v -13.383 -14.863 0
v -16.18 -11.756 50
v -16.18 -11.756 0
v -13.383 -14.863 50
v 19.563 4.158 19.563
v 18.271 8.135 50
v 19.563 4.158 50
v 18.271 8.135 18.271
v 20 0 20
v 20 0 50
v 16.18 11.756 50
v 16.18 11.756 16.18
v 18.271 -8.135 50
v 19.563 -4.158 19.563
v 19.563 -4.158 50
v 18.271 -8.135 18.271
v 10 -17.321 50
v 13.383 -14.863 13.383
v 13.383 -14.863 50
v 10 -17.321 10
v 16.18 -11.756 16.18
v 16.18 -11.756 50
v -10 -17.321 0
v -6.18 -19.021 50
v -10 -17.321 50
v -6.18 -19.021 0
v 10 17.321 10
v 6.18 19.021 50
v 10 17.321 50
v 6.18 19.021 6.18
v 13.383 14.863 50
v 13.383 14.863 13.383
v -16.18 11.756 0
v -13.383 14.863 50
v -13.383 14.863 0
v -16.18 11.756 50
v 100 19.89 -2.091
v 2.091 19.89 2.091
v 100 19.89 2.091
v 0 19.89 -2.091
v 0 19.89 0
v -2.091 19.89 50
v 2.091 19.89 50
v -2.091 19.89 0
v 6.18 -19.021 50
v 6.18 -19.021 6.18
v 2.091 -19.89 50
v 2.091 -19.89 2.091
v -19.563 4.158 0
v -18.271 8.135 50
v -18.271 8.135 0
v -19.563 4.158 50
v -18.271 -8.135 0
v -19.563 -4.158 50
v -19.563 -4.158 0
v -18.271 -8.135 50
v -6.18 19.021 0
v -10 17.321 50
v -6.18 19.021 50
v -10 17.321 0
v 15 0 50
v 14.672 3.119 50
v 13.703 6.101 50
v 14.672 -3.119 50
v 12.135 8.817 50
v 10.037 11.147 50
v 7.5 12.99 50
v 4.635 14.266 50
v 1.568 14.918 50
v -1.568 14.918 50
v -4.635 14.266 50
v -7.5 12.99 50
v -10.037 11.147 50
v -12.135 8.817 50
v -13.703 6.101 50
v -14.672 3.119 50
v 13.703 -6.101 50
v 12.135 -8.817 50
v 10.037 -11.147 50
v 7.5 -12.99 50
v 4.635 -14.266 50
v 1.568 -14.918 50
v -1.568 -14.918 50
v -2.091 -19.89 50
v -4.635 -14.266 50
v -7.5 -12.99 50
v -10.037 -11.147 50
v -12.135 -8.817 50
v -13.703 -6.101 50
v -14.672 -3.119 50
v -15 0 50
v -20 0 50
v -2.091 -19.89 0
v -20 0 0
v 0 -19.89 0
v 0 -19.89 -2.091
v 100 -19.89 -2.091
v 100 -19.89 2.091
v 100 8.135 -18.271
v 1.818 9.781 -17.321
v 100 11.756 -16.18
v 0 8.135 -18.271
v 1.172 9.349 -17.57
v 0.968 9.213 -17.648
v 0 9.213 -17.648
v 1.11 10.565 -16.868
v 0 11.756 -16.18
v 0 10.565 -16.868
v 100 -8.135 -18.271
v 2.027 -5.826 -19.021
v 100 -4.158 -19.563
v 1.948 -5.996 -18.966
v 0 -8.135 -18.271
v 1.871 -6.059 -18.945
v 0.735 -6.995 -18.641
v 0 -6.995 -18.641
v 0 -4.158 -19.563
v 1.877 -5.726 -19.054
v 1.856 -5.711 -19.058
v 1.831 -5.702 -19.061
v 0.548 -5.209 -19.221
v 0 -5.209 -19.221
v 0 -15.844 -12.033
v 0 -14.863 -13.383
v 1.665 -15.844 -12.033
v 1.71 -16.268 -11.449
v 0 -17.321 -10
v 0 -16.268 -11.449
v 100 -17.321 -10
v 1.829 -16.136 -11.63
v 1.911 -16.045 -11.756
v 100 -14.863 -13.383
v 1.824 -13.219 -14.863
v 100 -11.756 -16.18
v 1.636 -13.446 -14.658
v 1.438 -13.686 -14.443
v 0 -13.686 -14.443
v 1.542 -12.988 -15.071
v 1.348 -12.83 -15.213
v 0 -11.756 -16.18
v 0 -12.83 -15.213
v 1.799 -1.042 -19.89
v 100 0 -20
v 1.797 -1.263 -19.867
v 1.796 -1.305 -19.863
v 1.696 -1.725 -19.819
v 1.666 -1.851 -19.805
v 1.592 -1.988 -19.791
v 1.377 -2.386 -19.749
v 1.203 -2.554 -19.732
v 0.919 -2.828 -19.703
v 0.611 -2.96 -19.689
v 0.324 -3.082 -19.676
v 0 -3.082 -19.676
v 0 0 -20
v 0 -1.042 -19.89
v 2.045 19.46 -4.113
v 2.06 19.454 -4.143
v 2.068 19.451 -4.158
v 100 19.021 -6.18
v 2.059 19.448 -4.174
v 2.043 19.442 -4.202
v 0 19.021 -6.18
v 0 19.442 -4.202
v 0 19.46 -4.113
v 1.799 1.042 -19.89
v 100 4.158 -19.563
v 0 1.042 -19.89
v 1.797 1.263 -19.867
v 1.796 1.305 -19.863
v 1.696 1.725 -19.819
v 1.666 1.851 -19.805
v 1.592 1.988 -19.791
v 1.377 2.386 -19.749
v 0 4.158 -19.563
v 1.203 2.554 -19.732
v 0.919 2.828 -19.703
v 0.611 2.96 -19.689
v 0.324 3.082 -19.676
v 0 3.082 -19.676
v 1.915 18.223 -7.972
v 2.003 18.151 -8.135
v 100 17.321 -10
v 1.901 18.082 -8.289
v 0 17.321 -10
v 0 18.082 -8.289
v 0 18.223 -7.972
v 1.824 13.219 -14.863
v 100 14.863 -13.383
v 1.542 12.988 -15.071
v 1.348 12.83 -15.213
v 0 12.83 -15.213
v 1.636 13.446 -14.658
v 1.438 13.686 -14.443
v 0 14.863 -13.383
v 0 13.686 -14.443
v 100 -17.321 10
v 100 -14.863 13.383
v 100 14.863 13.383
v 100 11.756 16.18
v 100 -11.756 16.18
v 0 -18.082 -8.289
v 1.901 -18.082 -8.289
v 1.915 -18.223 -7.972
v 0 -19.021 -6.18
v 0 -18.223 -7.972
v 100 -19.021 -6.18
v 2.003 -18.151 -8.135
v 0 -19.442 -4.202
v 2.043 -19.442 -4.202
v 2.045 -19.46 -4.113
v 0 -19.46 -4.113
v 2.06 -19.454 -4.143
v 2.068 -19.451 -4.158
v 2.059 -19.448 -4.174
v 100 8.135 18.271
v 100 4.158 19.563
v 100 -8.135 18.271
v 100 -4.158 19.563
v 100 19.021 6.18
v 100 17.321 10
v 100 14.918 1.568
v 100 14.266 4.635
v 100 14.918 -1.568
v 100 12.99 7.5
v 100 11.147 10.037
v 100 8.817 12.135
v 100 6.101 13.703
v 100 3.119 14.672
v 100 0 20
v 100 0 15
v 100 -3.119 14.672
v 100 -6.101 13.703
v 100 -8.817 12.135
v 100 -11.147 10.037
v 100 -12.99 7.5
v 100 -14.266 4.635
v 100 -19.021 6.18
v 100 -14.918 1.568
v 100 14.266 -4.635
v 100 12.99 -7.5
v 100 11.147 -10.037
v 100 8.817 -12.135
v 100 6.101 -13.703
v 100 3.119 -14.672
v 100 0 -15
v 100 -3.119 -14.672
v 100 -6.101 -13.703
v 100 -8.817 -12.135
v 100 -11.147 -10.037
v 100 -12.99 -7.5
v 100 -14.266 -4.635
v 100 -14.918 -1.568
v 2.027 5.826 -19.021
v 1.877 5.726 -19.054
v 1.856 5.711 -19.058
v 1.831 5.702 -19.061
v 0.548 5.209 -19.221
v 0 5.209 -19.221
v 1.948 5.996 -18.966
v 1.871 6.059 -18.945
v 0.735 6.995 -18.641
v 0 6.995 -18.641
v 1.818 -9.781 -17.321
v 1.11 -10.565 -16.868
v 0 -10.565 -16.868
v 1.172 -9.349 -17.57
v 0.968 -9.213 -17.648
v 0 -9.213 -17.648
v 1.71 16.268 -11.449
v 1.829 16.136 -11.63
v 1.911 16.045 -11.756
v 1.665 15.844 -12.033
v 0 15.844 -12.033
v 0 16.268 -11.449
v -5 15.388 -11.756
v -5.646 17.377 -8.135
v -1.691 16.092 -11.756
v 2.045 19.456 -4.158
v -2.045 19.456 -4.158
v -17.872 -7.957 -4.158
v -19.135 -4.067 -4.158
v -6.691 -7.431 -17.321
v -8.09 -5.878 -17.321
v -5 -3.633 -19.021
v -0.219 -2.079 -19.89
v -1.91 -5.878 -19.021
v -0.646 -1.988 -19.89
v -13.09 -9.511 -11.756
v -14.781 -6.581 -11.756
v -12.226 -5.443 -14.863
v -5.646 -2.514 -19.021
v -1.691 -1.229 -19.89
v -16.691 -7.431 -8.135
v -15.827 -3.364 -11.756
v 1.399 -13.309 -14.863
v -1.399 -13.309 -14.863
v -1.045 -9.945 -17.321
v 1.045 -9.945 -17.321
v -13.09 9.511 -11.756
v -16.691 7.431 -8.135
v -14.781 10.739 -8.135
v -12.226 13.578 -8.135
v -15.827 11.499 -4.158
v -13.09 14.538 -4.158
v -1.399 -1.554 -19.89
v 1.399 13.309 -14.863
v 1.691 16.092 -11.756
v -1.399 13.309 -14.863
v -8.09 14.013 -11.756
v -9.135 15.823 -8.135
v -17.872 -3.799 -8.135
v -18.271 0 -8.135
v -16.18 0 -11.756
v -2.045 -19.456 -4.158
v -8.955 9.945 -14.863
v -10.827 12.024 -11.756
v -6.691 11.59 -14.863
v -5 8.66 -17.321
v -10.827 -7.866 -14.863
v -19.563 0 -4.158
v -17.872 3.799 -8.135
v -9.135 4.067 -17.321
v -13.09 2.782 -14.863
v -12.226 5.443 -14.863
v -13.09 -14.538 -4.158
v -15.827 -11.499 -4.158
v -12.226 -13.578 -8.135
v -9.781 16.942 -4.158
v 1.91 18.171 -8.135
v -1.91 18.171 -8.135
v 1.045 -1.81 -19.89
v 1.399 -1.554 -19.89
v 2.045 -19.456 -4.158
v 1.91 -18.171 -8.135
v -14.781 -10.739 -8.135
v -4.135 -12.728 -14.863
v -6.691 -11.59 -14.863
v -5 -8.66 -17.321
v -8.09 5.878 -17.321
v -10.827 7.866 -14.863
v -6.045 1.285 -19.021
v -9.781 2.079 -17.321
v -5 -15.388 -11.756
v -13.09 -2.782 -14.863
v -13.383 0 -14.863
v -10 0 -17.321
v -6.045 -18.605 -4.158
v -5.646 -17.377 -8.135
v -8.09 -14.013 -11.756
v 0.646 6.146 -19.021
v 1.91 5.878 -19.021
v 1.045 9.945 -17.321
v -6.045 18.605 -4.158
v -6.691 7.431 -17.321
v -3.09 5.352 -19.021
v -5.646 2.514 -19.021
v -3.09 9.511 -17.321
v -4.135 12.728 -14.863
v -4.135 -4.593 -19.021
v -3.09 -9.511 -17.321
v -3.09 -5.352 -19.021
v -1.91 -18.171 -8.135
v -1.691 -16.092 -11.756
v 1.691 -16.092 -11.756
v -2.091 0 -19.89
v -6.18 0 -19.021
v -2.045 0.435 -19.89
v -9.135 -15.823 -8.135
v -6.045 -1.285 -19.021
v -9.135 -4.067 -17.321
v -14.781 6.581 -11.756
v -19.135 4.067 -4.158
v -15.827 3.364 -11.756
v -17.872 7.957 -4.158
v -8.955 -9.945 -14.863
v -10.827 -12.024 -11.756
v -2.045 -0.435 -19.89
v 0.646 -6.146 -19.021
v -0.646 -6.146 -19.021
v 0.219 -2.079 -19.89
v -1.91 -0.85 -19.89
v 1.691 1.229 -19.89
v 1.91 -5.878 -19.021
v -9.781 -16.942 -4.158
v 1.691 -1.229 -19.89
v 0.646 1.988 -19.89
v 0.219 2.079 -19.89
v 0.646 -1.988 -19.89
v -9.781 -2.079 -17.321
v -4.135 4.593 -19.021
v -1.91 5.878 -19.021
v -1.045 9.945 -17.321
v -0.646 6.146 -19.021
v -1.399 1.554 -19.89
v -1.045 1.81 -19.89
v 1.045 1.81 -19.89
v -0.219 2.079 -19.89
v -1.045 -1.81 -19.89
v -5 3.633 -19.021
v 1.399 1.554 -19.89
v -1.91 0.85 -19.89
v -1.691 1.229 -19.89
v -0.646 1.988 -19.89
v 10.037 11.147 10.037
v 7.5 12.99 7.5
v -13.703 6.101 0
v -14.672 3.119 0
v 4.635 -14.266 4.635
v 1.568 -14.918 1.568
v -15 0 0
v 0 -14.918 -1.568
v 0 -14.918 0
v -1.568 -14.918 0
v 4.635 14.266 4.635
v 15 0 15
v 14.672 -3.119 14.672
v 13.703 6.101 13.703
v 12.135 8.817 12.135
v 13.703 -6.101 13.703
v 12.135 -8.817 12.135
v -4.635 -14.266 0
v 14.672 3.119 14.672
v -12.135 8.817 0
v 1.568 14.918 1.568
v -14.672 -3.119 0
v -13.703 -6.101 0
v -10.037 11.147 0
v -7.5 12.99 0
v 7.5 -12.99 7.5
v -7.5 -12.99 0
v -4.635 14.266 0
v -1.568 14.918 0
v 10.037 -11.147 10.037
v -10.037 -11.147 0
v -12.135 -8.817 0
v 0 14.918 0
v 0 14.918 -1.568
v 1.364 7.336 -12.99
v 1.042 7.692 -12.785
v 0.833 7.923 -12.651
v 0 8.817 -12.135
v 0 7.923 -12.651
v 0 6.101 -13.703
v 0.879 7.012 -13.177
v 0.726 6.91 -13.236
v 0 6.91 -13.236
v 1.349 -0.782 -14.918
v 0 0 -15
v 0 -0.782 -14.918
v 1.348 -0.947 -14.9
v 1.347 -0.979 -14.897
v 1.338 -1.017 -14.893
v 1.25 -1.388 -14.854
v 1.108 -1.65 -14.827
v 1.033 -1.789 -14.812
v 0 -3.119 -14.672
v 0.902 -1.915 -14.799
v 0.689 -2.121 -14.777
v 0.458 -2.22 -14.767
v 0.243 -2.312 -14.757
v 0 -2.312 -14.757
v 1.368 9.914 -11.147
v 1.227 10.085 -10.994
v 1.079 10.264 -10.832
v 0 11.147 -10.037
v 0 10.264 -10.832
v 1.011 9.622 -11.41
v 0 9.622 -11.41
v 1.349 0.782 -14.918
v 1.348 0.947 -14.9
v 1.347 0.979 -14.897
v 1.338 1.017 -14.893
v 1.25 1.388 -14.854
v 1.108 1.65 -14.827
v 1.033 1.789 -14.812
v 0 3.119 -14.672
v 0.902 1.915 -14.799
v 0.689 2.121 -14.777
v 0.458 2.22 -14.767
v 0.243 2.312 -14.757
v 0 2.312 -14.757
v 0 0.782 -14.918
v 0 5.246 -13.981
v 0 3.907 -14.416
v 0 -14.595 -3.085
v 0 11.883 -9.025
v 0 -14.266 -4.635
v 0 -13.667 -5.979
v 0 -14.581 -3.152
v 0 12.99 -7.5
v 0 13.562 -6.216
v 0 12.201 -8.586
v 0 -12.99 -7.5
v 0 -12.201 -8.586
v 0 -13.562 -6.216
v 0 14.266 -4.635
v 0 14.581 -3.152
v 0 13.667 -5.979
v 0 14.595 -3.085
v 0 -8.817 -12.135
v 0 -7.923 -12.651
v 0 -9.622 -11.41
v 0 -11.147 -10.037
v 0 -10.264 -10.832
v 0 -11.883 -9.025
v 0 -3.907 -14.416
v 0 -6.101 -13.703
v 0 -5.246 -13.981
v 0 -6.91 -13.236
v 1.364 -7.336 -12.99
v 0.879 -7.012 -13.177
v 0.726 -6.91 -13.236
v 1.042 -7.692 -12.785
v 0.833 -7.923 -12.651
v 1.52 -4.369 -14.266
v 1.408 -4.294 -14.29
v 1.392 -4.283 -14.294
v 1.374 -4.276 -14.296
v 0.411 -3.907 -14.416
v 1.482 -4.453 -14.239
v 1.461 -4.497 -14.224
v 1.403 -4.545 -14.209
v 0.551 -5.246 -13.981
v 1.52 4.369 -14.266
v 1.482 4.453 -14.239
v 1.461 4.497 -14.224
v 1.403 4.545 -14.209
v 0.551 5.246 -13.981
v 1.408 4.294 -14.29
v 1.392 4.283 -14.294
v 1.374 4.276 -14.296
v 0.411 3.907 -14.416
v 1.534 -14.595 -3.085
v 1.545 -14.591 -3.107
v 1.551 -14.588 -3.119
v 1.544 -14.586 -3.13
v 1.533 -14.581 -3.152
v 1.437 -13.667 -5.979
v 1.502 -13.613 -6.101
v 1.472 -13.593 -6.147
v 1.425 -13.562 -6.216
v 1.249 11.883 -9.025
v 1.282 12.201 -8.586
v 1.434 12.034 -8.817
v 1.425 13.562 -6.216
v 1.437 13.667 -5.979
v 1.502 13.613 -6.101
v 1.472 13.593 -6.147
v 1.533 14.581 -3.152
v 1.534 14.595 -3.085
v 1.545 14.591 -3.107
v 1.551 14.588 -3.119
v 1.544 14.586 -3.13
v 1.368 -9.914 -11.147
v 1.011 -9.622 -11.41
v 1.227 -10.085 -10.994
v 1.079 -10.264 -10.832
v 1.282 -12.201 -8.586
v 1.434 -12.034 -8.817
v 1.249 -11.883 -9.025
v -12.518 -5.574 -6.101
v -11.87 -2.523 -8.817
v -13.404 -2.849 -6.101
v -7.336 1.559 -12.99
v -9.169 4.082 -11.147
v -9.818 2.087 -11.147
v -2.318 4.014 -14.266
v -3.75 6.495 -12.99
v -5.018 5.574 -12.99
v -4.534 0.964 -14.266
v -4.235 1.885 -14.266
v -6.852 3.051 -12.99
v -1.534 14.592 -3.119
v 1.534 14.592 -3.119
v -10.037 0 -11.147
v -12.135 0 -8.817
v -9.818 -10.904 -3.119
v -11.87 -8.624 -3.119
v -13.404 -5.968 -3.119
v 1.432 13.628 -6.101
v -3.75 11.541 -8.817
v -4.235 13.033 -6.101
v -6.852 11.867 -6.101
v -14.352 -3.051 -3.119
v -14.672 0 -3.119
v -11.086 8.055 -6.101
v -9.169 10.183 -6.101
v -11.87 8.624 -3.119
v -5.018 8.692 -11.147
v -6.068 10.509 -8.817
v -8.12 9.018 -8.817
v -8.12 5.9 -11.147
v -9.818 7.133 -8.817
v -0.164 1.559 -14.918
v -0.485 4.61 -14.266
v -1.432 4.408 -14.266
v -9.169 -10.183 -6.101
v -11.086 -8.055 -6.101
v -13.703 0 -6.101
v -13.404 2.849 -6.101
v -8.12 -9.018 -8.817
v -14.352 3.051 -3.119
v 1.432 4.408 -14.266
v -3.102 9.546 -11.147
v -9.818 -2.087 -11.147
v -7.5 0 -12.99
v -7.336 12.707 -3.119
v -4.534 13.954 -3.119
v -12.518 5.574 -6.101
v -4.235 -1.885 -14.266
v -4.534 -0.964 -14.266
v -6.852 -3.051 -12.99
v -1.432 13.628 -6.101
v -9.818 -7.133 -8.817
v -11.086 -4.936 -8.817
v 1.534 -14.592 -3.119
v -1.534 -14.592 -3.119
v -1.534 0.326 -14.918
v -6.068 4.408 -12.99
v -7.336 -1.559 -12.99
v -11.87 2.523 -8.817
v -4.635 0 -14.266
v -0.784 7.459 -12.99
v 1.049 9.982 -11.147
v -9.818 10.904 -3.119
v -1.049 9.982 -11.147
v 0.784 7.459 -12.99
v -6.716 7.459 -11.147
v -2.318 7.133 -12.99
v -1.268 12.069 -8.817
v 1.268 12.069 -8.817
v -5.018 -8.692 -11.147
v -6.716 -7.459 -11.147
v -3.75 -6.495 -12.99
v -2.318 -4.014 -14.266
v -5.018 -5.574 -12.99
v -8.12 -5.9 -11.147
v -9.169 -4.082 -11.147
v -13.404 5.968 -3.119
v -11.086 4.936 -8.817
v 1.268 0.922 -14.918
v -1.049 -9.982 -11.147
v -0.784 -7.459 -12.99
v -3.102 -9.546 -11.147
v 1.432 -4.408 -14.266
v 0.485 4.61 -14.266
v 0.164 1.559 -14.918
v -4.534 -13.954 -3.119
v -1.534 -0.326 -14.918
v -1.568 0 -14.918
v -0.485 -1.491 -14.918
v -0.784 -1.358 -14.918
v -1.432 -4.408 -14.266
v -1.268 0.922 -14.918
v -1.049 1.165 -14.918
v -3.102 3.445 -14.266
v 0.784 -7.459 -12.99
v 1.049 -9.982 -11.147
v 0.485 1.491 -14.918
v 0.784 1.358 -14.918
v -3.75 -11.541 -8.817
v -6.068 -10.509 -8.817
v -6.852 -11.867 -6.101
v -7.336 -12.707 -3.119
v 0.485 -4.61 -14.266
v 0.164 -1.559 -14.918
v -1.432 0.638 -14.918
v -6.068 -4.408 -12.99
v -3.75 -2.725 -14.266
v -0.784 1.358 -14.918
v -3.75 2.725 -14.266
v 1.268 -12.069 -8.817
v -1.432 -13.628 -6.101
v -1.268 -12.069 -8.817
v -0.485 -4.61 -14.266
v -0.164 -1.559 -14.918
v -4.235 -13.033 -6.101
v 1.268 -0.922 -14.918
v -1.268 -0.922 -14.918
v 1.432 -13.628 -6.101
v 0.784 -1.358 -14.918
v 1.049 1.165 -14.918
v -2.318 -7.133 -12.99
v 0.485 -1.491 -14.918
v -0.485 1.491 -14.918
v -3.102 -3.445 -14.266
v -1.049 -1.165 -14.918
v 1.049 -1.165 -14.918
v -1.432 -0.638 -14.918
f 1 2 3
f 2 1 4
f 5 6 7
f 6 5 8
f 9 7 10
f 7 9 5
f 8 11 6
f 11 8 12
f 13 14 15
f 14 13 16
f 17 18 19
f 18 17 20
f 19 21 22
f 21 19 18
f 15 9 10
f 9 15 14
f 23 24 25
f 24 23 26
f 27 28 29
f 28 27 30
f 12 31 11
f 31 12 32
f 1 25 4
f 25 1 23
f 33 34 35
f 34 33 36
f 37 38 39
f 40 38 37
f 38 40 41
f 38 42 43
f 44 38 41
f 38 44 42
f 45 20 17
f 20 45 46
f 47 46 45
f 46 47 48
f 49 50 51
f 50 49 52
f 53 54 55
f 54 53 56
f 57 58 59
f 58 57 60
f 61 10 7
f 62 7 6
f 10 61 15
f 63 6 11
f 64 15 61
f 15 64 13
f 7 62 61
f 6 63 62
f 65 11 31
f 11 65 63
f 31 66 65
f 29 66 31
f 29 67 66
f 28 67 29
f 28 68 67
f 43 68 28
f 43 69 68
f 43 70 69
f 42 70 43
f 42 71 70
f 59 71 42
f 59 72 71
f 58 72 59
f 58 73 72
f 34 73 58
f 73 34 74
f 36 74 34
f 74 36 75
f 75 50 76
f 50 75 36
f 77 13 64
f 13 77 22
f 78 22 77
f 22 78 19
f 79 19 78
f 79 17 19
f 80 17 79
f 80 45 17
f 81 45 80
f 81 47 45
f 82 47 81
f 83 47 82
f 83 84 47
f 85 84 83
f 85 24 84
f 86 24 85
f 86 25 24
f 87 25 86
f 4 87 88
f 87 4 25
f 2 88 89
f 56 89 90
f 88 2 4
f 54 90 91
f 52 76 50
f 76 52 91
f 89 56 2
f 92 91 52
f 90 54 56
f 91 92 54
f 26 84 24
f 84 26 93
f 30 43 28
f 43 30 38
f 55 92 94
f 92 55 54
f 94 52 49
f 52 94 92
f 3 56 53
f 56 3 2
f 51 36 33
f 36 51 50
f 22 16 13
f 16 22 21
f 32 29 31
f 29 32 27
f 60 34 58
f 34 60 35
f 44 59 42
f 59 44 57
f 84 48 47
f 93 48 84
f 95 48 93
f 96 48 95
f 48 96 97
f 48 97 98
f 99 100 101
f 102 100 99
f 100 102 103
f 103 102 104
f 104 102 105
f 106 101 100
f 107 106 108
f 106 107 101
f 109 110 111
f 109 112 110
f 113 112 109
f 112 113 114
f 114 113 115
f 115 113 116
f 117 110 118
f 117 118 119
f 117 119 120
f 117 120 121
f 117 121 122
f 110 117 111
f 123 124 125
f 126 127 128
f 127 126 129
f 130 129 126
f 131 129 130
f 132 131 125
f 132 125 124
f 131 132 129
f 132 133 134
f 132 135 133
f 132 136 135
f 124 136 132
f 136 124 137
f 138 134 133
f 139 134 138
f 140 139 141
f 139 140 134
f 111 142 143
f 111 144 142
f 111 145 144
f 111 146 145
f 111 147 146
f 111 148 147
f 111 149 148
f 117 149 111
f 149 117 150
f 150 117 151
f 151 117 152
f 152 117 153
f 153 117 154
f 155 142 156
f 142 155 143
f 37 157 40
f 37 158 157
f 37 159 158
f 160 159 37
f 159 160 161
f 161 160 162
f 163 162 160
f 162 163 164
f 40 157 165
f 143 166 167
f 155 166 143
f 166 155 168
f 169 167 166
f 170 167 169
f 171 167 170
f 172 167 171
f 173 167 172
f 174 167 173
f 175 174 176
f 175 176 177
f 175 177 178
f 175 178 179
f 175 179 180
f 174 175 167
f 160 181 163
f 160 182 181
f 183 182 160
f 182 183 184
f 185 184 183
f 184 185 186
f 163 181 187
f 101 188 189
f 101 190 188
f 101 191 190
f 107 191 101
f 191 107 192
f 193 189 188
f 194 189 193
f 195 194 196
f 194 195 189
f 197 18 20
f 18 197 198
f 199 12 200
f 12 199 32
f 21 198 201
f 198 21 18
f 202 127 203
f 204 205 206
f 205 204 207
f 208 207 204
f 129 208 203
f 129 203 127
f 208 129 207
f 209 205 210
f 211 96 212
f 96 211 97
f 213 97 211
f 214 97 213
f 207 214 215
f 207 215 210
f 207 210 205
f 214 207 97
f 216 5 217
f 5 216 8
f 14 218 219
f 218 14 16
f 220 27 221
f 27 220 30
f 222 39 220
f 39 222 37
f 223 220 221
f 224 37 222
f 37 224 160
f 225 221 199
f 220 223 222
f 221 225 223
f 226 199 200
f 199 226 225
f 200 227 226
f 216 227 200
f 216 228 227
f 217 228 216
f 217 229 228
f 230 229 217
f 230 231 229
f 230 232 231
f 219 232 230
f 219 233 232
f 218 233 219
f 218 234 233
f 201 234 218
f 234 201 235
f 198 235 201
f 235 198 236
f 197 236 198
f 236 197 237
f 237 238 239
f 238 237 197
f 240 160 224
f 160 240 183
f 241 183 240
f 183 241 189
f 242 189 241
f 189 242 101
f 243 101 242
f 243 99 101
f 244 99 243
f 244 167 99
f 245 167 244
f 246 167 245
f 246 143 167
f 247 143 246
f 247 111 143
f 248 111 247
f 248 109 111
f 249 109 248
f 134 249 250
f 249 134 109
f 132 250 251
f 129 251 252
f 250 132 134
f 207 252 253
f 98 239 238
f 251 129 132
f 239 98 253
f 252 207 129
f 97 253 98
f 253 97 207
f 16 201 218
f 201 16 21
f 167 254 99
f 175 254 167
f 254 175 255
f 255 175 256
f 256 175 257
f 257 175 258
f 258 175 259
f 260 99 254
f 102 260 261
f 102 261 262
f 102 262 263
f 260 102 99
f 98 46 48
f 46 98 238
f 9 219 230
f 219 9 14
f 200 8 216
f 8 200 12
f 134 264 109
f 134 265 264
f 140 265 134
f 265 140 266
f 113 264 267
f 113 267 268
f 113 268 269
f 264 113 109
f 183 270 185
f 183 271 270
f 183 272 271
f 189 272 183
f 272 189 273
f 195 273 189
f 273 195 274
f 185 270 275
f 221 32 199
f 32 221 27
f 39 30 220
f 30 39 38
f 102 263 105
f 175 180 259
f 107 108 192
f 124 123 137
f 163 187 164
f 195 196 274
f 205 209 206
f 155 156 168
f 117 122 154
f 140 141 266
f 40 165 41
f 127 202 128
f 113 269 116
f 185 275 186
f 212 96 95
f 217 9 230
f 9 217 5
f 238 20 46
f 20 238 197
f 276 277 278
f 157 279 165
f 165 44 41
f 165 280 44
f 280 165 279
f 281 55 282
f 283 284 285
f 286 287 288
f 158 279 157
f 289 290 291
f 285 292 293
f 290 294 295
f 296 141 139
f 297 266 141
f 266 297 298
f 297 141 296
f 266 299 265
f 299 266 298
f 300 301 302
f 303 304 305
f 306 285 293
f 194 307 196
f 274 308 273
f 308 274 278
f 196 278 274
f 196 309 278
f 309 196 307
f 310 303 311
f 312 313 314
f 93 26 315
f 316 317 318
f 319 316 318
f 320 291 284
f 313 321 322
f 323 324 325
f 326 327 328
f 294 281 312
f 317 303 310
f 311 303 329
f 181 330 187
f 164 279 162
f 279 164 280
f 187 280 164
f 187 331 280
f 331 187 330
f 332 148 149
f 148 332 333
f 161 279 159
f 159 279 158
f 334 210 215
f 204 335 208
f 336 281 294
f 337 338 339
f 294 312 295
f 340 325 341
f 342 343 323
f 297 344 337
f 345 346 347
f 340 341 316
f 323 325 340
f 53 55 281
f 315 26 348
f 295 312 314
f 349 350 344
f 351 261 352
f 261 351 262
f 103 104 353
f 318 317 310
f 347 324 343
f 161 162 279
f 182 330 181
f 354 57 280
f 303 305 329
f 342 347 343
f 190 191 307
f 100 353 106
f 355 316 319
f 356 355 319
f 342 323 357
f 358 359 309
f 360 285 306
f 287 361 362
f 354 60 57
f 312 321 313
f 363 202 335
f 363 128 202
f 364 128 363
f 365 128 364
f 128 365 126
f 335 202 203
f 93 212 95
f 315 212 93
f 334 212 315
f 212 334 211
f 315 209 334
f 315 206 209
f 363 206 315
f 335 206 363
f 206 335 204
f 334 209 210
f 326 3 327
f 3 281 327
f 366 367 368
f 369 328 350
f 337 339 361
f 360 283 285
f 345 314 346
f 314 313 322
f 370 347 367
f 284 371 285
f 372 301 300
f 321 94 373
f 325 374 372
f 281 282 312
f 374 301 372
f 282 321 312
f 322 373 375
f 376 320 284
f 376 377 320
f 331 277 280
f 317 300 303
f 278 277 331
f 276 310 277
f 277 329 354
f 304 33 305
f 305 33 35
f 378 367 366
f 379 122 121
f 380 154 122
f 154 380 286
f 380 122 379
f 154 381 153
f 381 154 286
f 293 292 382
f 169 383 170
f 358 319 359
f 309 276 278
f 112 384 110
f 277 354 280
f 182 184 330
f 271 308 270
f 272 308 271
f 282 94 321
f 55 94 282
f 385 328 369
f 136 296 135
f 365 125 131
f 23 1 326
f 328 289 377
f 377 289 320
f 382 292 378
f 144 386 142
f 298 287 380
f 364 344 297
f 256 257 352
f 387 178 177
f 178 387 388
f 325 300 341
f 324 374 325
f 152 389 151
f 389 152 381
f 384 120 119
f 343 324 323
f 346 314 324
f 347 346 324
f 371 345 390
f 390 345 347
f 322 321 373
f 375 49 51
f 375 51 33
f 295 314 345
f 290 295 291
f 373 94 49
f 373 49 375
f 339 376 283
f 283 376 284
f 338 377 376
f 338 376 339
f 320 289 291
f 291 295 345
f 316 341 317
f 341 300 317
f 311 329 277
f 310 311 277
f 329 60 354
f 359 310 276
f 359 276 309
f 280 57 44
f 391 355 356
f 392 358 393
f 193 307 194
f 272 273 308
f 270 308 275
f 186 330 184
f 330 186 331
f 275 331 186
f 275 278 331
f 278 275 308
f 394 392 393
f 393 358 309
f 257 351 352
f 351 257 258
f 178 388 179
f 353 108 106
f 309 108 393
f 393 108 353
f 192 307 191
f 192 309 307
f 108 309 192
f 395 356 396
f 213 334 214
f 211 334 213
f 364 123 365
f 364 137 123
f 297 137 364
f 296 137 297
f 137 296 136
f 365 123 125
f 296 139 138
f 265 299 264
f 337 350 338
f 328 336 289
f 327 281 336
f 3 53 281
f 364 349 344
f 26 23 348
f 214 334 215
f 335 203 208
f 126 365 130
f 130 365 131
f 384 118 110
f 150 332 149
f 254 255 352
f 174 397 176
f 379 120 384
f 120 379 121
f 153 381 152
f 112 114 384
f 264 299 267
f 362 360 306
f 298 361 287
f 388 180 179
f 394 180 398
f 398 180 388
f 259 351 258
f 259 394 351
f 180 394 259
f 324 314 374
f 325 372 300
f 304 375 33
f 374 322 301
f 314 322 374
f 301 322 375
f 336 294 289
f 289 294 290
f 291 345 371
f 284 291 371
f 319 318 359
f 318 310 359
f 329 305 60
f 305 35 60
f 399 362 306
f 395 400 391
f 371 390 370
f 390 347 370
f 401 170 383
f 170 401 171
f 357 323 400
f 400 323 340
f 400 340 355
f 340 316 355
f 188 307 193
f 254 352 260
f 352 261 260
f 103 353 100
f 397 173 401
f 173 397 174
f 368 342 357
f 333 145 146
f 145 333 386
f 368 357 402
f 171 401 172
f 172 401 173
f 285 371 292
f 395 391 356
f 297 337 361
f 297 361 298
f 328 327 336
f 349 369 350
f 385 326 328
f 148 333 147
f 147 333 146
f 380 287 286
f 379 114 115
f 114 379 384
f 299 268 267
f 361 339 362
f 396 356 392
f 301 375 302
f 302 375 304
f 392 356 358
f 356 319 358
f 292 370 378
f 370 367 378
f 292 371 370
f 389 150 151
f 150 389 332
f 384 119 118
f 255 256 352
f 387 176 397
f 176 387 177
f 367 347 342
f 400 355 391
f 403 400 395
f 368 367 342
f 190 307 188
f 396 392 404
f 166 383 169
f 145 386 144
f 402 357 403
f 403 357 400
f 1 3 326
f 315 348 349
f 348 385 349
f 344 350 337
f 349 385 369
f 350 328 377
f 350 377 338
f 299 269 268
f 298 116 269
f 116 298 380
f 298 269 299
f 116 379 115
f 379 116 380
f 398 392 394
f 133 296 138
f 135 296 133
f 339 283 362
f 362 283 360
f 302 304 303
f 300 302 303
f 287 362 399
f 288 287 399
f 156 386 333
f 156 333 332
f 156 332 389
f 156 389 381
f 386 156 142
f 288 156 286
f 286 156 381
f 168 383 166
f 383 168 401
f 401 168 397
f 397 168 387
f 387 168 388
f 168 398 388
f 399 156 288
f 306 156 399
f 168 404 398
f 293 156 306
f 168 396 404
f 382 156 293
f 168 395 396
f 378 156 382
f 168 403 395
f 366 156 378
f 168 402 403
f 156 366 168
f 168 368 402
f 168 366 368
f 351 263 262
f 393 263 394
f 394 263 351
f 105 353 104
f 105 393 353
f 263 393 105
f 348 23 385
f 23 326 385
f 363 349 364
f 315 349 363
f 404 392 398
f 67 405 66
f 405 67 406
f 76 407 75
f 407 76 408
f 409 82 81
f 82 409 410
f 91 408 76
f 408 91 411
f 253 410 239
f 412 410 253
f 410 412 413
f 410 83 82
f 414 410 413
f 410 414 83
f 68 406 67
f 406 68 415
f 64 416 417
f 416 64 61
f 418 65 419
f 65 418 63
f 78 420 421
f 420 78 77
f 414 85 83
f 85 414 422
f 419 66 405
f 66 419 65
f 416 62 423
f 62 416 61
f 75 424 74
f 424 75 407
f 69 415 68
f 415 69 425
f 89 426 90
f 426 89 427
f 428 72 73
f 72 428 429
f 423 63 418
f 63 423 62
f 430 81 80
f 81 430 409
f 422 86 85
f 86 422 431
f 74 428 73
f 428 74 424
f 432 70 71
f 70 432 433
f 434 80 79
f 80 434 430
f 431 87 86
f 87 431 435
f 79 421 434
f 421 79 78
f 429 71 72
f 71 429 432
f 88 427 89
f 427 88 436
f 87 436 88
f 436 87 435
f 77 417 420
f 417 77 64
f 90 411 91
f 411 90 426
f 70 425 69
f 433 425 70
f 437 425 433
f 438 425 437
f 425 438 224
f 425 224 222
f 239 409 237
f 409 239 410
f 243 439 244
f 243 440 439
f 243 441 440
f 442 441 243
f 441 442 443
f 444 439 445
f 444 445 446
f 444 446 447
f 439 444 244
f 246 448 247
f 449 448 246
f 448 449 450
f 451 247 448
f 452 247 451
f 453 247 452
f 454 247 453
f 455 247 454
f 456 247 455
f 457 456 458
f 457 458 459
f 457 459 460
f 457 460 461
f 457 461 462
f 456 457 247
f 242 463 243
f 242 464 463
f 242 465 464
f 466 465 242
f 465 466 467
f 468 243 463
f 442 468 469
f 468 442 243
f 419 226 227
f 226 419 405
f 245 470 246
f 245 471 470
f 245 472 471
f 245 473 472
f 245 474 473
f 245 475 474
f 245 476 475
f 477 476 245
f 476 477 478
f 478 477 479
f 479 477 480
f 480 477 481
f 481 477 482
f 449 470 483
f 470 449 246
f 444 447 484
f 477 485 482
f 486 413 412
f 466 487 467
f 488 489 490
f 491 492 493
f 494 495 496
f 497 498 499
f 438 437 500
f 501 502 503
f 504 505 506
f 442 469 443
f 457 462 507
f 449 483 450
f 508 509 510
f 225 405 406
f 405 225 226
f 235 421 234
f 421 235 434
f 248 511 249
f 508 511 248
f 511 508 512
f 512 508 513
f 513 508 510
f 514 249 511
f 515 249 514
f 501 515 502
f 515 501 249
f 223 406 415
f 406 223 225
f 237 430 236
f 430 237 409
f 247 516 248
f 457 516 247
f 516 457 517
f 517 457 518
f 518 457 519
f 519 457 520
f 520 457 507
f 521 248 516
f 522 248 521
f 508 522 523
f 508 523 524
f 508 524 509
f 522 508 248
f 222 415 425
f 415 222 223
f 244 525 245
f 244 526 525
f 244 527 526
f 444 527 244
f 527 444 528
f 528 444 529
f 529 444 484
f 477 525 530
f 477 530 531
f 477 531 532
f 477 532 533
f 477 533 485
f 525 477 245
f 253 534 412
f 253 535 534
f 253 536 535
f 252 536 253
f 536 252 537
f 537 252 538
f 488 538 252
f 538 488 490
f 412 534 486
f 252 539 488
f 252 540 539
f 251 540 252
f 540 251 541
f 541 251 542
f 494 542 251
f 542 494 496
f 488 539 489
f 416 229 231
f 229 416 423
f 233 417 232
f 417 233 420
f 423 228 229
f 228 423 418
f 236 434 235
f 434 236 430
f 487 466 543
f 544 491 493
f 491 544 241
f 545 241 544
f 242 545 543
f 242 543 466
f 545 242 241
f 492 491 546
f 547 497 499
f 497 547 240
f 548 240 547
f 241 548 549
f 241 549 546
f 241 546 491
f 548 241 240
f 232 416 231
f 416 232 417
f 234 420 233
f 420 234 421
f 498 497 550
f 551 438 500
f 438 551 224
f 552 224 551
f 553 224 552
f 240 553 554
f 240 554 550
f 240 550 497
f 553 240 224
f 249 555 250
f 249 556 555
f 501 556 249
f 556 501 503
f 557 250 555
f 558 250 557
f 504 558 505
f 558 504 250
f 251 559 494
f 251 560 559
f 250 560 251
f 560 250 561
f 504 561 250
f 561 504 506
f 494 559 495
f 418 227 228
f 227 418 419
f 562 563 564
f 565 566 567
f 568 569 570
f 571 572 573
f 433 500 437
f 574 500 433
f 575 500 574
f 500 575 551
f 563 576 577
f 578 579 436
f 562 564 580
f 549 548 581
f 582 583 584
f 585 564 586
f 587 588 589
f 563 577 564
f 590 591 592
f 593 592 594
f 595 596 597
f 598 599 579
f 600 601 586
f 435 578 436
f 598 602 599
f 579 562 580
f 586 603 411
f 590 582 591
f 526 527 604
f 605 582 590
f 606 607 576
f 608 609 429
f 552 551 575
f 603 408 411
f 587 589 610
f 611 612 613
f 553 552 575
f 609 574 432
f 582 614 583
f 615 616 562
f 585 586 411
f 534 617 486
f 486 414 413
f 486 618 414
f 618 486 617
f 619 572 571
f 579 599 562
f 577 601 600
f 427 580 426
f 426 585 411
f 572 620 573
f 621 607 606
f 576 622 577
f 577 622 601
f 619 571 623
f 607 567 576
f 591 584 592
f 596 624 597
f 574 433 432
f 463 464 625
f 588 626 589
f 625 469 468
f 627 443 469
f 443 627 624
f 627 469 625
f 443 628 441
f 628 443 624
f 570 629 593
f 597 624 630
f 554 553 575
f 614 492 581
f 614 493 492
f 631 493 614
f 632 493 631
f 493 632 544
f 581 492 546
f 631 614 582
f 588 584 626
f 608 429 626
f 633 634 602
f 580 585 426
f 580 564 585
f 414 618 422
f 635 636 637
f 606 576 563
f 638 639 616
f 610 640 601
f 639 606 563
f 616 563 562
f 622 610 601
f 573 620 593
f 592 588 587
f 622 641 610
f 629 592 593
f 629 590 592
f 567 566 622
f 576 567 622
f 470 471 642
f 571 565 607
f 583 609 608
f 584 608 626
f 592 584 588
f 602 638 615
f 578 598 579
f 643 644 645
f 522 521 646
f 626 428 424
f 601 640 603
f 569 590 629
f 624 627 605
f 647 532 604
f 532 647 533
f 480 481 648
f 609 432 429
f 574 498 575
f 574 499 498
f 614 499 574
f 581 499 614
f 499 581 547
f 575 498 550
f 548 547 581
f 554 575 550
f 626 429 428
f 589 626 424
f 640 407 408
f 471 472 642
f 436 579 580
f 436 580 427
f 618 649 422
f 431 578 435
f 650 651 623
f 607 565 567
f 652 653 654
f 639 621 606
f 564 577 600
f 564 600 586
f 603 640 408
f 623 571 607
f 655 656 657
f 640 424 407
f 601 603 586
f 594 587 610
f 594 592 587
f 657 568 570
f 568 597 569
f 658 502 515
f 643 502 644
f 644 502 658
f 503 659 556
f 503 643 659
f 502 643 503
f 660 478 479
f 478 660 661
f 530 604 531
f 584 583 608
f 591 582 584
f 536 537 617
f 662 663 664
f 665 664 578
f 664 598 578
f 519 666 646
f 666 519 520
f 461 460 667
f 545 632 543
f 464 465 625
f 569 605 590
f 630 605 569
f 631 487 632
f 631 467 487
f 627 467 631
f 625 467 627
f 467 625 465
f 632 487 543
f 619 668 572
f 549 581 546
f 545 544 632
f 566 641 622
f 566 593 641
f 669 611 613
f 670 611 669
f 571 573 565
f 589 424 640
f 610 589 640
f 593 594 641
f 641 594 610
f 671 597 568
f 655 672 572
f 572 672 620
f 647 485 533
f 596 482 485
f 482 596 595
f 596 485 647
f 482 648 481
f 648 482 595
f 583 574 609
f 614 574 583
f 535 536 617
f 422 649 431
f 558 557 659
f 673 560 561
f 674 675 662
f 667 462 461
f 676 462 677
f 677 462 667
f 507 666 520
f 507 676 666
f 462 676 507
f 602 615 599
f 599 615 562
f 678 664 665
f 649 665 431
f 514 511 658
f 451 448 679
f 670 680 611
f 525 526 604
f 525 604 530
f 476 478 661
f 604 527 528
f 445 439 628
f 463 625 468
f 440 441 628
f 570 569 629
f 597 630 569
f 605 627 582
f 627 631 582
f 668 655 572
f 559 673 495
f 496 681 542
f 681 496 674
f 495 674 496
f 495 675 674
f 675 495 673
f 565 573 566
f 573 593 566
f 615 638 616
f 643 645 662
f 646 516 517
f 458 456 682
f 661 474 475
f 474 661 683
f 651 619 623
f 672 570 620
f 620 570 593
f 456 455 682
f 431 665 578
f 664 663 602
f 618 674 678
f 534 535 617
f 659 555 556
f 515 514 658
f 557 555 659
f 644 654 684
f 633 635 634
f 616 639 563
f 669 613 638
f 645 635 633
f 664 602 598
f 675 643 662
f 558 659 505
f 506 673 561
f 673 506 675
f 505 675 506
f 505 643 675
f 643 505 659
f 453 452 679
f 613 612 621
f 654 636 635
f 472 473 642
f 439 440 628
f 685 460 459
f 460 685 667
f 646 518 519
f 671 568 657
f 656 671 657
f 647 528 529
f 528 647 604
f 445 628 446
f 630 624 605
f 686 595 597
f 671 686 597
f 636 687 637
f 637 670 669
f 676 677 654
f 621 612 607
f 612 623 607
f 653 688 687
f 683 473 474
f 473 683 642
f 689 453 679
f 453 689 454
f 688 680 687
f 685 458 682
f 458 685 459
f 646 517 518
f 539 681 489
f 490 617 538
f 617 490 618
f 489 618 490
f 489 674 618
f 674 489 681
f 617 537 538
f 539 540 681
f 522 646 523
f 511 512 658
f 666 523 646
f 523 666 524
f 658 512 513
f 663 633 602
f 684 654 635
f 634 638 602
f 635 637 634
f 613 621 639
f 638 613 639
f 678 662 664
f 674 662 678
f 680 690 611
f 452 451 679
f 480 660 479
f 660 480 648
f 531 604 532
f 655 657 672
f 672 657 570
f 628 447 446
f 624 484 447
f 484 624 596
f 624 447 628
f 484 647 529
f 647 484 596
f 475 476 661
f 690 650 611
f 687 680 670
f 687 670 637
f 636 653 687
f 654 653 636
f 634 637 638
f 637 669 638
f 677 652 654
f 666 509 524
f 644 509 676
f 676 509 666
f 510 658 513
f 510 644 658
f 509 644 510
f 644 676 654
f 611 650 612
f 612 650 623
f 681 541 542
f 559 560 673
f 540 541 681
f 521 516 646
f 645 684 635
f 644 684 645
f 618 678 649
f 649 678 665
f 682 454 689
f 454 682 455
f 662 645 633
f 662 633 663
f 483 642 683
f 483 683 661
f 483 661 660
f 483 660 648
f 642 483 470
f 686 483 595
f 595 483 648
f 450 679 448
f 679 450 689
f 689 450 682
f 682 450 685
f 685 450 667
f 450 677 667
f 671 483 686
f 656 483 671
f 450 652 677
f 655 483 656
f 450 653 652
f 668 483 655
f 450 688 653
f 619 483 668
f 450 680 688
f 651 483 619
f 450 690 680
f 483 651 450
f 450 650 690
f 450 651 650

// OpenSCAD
insideRadius=15;
outsideRadius=20;
lengthOfArm=50;

difference() {
    union() {
        cylinder (lengthOfArm,outsideRadius,outsideRadius);
        rotate([0,90,0])
            cylinder (lengthOfArm*2,outsideRadius,outsideRadius);
        sphere(r=outsideRadius);
    }

    cylinder (lengthOfArm+1,insideRadius,insideRadius);
    rotate([0,90,0])
        cylinder (lengthOfArm*2+1,insideRadius,insideRadius);
    sphere(r=insideRadius);
}
